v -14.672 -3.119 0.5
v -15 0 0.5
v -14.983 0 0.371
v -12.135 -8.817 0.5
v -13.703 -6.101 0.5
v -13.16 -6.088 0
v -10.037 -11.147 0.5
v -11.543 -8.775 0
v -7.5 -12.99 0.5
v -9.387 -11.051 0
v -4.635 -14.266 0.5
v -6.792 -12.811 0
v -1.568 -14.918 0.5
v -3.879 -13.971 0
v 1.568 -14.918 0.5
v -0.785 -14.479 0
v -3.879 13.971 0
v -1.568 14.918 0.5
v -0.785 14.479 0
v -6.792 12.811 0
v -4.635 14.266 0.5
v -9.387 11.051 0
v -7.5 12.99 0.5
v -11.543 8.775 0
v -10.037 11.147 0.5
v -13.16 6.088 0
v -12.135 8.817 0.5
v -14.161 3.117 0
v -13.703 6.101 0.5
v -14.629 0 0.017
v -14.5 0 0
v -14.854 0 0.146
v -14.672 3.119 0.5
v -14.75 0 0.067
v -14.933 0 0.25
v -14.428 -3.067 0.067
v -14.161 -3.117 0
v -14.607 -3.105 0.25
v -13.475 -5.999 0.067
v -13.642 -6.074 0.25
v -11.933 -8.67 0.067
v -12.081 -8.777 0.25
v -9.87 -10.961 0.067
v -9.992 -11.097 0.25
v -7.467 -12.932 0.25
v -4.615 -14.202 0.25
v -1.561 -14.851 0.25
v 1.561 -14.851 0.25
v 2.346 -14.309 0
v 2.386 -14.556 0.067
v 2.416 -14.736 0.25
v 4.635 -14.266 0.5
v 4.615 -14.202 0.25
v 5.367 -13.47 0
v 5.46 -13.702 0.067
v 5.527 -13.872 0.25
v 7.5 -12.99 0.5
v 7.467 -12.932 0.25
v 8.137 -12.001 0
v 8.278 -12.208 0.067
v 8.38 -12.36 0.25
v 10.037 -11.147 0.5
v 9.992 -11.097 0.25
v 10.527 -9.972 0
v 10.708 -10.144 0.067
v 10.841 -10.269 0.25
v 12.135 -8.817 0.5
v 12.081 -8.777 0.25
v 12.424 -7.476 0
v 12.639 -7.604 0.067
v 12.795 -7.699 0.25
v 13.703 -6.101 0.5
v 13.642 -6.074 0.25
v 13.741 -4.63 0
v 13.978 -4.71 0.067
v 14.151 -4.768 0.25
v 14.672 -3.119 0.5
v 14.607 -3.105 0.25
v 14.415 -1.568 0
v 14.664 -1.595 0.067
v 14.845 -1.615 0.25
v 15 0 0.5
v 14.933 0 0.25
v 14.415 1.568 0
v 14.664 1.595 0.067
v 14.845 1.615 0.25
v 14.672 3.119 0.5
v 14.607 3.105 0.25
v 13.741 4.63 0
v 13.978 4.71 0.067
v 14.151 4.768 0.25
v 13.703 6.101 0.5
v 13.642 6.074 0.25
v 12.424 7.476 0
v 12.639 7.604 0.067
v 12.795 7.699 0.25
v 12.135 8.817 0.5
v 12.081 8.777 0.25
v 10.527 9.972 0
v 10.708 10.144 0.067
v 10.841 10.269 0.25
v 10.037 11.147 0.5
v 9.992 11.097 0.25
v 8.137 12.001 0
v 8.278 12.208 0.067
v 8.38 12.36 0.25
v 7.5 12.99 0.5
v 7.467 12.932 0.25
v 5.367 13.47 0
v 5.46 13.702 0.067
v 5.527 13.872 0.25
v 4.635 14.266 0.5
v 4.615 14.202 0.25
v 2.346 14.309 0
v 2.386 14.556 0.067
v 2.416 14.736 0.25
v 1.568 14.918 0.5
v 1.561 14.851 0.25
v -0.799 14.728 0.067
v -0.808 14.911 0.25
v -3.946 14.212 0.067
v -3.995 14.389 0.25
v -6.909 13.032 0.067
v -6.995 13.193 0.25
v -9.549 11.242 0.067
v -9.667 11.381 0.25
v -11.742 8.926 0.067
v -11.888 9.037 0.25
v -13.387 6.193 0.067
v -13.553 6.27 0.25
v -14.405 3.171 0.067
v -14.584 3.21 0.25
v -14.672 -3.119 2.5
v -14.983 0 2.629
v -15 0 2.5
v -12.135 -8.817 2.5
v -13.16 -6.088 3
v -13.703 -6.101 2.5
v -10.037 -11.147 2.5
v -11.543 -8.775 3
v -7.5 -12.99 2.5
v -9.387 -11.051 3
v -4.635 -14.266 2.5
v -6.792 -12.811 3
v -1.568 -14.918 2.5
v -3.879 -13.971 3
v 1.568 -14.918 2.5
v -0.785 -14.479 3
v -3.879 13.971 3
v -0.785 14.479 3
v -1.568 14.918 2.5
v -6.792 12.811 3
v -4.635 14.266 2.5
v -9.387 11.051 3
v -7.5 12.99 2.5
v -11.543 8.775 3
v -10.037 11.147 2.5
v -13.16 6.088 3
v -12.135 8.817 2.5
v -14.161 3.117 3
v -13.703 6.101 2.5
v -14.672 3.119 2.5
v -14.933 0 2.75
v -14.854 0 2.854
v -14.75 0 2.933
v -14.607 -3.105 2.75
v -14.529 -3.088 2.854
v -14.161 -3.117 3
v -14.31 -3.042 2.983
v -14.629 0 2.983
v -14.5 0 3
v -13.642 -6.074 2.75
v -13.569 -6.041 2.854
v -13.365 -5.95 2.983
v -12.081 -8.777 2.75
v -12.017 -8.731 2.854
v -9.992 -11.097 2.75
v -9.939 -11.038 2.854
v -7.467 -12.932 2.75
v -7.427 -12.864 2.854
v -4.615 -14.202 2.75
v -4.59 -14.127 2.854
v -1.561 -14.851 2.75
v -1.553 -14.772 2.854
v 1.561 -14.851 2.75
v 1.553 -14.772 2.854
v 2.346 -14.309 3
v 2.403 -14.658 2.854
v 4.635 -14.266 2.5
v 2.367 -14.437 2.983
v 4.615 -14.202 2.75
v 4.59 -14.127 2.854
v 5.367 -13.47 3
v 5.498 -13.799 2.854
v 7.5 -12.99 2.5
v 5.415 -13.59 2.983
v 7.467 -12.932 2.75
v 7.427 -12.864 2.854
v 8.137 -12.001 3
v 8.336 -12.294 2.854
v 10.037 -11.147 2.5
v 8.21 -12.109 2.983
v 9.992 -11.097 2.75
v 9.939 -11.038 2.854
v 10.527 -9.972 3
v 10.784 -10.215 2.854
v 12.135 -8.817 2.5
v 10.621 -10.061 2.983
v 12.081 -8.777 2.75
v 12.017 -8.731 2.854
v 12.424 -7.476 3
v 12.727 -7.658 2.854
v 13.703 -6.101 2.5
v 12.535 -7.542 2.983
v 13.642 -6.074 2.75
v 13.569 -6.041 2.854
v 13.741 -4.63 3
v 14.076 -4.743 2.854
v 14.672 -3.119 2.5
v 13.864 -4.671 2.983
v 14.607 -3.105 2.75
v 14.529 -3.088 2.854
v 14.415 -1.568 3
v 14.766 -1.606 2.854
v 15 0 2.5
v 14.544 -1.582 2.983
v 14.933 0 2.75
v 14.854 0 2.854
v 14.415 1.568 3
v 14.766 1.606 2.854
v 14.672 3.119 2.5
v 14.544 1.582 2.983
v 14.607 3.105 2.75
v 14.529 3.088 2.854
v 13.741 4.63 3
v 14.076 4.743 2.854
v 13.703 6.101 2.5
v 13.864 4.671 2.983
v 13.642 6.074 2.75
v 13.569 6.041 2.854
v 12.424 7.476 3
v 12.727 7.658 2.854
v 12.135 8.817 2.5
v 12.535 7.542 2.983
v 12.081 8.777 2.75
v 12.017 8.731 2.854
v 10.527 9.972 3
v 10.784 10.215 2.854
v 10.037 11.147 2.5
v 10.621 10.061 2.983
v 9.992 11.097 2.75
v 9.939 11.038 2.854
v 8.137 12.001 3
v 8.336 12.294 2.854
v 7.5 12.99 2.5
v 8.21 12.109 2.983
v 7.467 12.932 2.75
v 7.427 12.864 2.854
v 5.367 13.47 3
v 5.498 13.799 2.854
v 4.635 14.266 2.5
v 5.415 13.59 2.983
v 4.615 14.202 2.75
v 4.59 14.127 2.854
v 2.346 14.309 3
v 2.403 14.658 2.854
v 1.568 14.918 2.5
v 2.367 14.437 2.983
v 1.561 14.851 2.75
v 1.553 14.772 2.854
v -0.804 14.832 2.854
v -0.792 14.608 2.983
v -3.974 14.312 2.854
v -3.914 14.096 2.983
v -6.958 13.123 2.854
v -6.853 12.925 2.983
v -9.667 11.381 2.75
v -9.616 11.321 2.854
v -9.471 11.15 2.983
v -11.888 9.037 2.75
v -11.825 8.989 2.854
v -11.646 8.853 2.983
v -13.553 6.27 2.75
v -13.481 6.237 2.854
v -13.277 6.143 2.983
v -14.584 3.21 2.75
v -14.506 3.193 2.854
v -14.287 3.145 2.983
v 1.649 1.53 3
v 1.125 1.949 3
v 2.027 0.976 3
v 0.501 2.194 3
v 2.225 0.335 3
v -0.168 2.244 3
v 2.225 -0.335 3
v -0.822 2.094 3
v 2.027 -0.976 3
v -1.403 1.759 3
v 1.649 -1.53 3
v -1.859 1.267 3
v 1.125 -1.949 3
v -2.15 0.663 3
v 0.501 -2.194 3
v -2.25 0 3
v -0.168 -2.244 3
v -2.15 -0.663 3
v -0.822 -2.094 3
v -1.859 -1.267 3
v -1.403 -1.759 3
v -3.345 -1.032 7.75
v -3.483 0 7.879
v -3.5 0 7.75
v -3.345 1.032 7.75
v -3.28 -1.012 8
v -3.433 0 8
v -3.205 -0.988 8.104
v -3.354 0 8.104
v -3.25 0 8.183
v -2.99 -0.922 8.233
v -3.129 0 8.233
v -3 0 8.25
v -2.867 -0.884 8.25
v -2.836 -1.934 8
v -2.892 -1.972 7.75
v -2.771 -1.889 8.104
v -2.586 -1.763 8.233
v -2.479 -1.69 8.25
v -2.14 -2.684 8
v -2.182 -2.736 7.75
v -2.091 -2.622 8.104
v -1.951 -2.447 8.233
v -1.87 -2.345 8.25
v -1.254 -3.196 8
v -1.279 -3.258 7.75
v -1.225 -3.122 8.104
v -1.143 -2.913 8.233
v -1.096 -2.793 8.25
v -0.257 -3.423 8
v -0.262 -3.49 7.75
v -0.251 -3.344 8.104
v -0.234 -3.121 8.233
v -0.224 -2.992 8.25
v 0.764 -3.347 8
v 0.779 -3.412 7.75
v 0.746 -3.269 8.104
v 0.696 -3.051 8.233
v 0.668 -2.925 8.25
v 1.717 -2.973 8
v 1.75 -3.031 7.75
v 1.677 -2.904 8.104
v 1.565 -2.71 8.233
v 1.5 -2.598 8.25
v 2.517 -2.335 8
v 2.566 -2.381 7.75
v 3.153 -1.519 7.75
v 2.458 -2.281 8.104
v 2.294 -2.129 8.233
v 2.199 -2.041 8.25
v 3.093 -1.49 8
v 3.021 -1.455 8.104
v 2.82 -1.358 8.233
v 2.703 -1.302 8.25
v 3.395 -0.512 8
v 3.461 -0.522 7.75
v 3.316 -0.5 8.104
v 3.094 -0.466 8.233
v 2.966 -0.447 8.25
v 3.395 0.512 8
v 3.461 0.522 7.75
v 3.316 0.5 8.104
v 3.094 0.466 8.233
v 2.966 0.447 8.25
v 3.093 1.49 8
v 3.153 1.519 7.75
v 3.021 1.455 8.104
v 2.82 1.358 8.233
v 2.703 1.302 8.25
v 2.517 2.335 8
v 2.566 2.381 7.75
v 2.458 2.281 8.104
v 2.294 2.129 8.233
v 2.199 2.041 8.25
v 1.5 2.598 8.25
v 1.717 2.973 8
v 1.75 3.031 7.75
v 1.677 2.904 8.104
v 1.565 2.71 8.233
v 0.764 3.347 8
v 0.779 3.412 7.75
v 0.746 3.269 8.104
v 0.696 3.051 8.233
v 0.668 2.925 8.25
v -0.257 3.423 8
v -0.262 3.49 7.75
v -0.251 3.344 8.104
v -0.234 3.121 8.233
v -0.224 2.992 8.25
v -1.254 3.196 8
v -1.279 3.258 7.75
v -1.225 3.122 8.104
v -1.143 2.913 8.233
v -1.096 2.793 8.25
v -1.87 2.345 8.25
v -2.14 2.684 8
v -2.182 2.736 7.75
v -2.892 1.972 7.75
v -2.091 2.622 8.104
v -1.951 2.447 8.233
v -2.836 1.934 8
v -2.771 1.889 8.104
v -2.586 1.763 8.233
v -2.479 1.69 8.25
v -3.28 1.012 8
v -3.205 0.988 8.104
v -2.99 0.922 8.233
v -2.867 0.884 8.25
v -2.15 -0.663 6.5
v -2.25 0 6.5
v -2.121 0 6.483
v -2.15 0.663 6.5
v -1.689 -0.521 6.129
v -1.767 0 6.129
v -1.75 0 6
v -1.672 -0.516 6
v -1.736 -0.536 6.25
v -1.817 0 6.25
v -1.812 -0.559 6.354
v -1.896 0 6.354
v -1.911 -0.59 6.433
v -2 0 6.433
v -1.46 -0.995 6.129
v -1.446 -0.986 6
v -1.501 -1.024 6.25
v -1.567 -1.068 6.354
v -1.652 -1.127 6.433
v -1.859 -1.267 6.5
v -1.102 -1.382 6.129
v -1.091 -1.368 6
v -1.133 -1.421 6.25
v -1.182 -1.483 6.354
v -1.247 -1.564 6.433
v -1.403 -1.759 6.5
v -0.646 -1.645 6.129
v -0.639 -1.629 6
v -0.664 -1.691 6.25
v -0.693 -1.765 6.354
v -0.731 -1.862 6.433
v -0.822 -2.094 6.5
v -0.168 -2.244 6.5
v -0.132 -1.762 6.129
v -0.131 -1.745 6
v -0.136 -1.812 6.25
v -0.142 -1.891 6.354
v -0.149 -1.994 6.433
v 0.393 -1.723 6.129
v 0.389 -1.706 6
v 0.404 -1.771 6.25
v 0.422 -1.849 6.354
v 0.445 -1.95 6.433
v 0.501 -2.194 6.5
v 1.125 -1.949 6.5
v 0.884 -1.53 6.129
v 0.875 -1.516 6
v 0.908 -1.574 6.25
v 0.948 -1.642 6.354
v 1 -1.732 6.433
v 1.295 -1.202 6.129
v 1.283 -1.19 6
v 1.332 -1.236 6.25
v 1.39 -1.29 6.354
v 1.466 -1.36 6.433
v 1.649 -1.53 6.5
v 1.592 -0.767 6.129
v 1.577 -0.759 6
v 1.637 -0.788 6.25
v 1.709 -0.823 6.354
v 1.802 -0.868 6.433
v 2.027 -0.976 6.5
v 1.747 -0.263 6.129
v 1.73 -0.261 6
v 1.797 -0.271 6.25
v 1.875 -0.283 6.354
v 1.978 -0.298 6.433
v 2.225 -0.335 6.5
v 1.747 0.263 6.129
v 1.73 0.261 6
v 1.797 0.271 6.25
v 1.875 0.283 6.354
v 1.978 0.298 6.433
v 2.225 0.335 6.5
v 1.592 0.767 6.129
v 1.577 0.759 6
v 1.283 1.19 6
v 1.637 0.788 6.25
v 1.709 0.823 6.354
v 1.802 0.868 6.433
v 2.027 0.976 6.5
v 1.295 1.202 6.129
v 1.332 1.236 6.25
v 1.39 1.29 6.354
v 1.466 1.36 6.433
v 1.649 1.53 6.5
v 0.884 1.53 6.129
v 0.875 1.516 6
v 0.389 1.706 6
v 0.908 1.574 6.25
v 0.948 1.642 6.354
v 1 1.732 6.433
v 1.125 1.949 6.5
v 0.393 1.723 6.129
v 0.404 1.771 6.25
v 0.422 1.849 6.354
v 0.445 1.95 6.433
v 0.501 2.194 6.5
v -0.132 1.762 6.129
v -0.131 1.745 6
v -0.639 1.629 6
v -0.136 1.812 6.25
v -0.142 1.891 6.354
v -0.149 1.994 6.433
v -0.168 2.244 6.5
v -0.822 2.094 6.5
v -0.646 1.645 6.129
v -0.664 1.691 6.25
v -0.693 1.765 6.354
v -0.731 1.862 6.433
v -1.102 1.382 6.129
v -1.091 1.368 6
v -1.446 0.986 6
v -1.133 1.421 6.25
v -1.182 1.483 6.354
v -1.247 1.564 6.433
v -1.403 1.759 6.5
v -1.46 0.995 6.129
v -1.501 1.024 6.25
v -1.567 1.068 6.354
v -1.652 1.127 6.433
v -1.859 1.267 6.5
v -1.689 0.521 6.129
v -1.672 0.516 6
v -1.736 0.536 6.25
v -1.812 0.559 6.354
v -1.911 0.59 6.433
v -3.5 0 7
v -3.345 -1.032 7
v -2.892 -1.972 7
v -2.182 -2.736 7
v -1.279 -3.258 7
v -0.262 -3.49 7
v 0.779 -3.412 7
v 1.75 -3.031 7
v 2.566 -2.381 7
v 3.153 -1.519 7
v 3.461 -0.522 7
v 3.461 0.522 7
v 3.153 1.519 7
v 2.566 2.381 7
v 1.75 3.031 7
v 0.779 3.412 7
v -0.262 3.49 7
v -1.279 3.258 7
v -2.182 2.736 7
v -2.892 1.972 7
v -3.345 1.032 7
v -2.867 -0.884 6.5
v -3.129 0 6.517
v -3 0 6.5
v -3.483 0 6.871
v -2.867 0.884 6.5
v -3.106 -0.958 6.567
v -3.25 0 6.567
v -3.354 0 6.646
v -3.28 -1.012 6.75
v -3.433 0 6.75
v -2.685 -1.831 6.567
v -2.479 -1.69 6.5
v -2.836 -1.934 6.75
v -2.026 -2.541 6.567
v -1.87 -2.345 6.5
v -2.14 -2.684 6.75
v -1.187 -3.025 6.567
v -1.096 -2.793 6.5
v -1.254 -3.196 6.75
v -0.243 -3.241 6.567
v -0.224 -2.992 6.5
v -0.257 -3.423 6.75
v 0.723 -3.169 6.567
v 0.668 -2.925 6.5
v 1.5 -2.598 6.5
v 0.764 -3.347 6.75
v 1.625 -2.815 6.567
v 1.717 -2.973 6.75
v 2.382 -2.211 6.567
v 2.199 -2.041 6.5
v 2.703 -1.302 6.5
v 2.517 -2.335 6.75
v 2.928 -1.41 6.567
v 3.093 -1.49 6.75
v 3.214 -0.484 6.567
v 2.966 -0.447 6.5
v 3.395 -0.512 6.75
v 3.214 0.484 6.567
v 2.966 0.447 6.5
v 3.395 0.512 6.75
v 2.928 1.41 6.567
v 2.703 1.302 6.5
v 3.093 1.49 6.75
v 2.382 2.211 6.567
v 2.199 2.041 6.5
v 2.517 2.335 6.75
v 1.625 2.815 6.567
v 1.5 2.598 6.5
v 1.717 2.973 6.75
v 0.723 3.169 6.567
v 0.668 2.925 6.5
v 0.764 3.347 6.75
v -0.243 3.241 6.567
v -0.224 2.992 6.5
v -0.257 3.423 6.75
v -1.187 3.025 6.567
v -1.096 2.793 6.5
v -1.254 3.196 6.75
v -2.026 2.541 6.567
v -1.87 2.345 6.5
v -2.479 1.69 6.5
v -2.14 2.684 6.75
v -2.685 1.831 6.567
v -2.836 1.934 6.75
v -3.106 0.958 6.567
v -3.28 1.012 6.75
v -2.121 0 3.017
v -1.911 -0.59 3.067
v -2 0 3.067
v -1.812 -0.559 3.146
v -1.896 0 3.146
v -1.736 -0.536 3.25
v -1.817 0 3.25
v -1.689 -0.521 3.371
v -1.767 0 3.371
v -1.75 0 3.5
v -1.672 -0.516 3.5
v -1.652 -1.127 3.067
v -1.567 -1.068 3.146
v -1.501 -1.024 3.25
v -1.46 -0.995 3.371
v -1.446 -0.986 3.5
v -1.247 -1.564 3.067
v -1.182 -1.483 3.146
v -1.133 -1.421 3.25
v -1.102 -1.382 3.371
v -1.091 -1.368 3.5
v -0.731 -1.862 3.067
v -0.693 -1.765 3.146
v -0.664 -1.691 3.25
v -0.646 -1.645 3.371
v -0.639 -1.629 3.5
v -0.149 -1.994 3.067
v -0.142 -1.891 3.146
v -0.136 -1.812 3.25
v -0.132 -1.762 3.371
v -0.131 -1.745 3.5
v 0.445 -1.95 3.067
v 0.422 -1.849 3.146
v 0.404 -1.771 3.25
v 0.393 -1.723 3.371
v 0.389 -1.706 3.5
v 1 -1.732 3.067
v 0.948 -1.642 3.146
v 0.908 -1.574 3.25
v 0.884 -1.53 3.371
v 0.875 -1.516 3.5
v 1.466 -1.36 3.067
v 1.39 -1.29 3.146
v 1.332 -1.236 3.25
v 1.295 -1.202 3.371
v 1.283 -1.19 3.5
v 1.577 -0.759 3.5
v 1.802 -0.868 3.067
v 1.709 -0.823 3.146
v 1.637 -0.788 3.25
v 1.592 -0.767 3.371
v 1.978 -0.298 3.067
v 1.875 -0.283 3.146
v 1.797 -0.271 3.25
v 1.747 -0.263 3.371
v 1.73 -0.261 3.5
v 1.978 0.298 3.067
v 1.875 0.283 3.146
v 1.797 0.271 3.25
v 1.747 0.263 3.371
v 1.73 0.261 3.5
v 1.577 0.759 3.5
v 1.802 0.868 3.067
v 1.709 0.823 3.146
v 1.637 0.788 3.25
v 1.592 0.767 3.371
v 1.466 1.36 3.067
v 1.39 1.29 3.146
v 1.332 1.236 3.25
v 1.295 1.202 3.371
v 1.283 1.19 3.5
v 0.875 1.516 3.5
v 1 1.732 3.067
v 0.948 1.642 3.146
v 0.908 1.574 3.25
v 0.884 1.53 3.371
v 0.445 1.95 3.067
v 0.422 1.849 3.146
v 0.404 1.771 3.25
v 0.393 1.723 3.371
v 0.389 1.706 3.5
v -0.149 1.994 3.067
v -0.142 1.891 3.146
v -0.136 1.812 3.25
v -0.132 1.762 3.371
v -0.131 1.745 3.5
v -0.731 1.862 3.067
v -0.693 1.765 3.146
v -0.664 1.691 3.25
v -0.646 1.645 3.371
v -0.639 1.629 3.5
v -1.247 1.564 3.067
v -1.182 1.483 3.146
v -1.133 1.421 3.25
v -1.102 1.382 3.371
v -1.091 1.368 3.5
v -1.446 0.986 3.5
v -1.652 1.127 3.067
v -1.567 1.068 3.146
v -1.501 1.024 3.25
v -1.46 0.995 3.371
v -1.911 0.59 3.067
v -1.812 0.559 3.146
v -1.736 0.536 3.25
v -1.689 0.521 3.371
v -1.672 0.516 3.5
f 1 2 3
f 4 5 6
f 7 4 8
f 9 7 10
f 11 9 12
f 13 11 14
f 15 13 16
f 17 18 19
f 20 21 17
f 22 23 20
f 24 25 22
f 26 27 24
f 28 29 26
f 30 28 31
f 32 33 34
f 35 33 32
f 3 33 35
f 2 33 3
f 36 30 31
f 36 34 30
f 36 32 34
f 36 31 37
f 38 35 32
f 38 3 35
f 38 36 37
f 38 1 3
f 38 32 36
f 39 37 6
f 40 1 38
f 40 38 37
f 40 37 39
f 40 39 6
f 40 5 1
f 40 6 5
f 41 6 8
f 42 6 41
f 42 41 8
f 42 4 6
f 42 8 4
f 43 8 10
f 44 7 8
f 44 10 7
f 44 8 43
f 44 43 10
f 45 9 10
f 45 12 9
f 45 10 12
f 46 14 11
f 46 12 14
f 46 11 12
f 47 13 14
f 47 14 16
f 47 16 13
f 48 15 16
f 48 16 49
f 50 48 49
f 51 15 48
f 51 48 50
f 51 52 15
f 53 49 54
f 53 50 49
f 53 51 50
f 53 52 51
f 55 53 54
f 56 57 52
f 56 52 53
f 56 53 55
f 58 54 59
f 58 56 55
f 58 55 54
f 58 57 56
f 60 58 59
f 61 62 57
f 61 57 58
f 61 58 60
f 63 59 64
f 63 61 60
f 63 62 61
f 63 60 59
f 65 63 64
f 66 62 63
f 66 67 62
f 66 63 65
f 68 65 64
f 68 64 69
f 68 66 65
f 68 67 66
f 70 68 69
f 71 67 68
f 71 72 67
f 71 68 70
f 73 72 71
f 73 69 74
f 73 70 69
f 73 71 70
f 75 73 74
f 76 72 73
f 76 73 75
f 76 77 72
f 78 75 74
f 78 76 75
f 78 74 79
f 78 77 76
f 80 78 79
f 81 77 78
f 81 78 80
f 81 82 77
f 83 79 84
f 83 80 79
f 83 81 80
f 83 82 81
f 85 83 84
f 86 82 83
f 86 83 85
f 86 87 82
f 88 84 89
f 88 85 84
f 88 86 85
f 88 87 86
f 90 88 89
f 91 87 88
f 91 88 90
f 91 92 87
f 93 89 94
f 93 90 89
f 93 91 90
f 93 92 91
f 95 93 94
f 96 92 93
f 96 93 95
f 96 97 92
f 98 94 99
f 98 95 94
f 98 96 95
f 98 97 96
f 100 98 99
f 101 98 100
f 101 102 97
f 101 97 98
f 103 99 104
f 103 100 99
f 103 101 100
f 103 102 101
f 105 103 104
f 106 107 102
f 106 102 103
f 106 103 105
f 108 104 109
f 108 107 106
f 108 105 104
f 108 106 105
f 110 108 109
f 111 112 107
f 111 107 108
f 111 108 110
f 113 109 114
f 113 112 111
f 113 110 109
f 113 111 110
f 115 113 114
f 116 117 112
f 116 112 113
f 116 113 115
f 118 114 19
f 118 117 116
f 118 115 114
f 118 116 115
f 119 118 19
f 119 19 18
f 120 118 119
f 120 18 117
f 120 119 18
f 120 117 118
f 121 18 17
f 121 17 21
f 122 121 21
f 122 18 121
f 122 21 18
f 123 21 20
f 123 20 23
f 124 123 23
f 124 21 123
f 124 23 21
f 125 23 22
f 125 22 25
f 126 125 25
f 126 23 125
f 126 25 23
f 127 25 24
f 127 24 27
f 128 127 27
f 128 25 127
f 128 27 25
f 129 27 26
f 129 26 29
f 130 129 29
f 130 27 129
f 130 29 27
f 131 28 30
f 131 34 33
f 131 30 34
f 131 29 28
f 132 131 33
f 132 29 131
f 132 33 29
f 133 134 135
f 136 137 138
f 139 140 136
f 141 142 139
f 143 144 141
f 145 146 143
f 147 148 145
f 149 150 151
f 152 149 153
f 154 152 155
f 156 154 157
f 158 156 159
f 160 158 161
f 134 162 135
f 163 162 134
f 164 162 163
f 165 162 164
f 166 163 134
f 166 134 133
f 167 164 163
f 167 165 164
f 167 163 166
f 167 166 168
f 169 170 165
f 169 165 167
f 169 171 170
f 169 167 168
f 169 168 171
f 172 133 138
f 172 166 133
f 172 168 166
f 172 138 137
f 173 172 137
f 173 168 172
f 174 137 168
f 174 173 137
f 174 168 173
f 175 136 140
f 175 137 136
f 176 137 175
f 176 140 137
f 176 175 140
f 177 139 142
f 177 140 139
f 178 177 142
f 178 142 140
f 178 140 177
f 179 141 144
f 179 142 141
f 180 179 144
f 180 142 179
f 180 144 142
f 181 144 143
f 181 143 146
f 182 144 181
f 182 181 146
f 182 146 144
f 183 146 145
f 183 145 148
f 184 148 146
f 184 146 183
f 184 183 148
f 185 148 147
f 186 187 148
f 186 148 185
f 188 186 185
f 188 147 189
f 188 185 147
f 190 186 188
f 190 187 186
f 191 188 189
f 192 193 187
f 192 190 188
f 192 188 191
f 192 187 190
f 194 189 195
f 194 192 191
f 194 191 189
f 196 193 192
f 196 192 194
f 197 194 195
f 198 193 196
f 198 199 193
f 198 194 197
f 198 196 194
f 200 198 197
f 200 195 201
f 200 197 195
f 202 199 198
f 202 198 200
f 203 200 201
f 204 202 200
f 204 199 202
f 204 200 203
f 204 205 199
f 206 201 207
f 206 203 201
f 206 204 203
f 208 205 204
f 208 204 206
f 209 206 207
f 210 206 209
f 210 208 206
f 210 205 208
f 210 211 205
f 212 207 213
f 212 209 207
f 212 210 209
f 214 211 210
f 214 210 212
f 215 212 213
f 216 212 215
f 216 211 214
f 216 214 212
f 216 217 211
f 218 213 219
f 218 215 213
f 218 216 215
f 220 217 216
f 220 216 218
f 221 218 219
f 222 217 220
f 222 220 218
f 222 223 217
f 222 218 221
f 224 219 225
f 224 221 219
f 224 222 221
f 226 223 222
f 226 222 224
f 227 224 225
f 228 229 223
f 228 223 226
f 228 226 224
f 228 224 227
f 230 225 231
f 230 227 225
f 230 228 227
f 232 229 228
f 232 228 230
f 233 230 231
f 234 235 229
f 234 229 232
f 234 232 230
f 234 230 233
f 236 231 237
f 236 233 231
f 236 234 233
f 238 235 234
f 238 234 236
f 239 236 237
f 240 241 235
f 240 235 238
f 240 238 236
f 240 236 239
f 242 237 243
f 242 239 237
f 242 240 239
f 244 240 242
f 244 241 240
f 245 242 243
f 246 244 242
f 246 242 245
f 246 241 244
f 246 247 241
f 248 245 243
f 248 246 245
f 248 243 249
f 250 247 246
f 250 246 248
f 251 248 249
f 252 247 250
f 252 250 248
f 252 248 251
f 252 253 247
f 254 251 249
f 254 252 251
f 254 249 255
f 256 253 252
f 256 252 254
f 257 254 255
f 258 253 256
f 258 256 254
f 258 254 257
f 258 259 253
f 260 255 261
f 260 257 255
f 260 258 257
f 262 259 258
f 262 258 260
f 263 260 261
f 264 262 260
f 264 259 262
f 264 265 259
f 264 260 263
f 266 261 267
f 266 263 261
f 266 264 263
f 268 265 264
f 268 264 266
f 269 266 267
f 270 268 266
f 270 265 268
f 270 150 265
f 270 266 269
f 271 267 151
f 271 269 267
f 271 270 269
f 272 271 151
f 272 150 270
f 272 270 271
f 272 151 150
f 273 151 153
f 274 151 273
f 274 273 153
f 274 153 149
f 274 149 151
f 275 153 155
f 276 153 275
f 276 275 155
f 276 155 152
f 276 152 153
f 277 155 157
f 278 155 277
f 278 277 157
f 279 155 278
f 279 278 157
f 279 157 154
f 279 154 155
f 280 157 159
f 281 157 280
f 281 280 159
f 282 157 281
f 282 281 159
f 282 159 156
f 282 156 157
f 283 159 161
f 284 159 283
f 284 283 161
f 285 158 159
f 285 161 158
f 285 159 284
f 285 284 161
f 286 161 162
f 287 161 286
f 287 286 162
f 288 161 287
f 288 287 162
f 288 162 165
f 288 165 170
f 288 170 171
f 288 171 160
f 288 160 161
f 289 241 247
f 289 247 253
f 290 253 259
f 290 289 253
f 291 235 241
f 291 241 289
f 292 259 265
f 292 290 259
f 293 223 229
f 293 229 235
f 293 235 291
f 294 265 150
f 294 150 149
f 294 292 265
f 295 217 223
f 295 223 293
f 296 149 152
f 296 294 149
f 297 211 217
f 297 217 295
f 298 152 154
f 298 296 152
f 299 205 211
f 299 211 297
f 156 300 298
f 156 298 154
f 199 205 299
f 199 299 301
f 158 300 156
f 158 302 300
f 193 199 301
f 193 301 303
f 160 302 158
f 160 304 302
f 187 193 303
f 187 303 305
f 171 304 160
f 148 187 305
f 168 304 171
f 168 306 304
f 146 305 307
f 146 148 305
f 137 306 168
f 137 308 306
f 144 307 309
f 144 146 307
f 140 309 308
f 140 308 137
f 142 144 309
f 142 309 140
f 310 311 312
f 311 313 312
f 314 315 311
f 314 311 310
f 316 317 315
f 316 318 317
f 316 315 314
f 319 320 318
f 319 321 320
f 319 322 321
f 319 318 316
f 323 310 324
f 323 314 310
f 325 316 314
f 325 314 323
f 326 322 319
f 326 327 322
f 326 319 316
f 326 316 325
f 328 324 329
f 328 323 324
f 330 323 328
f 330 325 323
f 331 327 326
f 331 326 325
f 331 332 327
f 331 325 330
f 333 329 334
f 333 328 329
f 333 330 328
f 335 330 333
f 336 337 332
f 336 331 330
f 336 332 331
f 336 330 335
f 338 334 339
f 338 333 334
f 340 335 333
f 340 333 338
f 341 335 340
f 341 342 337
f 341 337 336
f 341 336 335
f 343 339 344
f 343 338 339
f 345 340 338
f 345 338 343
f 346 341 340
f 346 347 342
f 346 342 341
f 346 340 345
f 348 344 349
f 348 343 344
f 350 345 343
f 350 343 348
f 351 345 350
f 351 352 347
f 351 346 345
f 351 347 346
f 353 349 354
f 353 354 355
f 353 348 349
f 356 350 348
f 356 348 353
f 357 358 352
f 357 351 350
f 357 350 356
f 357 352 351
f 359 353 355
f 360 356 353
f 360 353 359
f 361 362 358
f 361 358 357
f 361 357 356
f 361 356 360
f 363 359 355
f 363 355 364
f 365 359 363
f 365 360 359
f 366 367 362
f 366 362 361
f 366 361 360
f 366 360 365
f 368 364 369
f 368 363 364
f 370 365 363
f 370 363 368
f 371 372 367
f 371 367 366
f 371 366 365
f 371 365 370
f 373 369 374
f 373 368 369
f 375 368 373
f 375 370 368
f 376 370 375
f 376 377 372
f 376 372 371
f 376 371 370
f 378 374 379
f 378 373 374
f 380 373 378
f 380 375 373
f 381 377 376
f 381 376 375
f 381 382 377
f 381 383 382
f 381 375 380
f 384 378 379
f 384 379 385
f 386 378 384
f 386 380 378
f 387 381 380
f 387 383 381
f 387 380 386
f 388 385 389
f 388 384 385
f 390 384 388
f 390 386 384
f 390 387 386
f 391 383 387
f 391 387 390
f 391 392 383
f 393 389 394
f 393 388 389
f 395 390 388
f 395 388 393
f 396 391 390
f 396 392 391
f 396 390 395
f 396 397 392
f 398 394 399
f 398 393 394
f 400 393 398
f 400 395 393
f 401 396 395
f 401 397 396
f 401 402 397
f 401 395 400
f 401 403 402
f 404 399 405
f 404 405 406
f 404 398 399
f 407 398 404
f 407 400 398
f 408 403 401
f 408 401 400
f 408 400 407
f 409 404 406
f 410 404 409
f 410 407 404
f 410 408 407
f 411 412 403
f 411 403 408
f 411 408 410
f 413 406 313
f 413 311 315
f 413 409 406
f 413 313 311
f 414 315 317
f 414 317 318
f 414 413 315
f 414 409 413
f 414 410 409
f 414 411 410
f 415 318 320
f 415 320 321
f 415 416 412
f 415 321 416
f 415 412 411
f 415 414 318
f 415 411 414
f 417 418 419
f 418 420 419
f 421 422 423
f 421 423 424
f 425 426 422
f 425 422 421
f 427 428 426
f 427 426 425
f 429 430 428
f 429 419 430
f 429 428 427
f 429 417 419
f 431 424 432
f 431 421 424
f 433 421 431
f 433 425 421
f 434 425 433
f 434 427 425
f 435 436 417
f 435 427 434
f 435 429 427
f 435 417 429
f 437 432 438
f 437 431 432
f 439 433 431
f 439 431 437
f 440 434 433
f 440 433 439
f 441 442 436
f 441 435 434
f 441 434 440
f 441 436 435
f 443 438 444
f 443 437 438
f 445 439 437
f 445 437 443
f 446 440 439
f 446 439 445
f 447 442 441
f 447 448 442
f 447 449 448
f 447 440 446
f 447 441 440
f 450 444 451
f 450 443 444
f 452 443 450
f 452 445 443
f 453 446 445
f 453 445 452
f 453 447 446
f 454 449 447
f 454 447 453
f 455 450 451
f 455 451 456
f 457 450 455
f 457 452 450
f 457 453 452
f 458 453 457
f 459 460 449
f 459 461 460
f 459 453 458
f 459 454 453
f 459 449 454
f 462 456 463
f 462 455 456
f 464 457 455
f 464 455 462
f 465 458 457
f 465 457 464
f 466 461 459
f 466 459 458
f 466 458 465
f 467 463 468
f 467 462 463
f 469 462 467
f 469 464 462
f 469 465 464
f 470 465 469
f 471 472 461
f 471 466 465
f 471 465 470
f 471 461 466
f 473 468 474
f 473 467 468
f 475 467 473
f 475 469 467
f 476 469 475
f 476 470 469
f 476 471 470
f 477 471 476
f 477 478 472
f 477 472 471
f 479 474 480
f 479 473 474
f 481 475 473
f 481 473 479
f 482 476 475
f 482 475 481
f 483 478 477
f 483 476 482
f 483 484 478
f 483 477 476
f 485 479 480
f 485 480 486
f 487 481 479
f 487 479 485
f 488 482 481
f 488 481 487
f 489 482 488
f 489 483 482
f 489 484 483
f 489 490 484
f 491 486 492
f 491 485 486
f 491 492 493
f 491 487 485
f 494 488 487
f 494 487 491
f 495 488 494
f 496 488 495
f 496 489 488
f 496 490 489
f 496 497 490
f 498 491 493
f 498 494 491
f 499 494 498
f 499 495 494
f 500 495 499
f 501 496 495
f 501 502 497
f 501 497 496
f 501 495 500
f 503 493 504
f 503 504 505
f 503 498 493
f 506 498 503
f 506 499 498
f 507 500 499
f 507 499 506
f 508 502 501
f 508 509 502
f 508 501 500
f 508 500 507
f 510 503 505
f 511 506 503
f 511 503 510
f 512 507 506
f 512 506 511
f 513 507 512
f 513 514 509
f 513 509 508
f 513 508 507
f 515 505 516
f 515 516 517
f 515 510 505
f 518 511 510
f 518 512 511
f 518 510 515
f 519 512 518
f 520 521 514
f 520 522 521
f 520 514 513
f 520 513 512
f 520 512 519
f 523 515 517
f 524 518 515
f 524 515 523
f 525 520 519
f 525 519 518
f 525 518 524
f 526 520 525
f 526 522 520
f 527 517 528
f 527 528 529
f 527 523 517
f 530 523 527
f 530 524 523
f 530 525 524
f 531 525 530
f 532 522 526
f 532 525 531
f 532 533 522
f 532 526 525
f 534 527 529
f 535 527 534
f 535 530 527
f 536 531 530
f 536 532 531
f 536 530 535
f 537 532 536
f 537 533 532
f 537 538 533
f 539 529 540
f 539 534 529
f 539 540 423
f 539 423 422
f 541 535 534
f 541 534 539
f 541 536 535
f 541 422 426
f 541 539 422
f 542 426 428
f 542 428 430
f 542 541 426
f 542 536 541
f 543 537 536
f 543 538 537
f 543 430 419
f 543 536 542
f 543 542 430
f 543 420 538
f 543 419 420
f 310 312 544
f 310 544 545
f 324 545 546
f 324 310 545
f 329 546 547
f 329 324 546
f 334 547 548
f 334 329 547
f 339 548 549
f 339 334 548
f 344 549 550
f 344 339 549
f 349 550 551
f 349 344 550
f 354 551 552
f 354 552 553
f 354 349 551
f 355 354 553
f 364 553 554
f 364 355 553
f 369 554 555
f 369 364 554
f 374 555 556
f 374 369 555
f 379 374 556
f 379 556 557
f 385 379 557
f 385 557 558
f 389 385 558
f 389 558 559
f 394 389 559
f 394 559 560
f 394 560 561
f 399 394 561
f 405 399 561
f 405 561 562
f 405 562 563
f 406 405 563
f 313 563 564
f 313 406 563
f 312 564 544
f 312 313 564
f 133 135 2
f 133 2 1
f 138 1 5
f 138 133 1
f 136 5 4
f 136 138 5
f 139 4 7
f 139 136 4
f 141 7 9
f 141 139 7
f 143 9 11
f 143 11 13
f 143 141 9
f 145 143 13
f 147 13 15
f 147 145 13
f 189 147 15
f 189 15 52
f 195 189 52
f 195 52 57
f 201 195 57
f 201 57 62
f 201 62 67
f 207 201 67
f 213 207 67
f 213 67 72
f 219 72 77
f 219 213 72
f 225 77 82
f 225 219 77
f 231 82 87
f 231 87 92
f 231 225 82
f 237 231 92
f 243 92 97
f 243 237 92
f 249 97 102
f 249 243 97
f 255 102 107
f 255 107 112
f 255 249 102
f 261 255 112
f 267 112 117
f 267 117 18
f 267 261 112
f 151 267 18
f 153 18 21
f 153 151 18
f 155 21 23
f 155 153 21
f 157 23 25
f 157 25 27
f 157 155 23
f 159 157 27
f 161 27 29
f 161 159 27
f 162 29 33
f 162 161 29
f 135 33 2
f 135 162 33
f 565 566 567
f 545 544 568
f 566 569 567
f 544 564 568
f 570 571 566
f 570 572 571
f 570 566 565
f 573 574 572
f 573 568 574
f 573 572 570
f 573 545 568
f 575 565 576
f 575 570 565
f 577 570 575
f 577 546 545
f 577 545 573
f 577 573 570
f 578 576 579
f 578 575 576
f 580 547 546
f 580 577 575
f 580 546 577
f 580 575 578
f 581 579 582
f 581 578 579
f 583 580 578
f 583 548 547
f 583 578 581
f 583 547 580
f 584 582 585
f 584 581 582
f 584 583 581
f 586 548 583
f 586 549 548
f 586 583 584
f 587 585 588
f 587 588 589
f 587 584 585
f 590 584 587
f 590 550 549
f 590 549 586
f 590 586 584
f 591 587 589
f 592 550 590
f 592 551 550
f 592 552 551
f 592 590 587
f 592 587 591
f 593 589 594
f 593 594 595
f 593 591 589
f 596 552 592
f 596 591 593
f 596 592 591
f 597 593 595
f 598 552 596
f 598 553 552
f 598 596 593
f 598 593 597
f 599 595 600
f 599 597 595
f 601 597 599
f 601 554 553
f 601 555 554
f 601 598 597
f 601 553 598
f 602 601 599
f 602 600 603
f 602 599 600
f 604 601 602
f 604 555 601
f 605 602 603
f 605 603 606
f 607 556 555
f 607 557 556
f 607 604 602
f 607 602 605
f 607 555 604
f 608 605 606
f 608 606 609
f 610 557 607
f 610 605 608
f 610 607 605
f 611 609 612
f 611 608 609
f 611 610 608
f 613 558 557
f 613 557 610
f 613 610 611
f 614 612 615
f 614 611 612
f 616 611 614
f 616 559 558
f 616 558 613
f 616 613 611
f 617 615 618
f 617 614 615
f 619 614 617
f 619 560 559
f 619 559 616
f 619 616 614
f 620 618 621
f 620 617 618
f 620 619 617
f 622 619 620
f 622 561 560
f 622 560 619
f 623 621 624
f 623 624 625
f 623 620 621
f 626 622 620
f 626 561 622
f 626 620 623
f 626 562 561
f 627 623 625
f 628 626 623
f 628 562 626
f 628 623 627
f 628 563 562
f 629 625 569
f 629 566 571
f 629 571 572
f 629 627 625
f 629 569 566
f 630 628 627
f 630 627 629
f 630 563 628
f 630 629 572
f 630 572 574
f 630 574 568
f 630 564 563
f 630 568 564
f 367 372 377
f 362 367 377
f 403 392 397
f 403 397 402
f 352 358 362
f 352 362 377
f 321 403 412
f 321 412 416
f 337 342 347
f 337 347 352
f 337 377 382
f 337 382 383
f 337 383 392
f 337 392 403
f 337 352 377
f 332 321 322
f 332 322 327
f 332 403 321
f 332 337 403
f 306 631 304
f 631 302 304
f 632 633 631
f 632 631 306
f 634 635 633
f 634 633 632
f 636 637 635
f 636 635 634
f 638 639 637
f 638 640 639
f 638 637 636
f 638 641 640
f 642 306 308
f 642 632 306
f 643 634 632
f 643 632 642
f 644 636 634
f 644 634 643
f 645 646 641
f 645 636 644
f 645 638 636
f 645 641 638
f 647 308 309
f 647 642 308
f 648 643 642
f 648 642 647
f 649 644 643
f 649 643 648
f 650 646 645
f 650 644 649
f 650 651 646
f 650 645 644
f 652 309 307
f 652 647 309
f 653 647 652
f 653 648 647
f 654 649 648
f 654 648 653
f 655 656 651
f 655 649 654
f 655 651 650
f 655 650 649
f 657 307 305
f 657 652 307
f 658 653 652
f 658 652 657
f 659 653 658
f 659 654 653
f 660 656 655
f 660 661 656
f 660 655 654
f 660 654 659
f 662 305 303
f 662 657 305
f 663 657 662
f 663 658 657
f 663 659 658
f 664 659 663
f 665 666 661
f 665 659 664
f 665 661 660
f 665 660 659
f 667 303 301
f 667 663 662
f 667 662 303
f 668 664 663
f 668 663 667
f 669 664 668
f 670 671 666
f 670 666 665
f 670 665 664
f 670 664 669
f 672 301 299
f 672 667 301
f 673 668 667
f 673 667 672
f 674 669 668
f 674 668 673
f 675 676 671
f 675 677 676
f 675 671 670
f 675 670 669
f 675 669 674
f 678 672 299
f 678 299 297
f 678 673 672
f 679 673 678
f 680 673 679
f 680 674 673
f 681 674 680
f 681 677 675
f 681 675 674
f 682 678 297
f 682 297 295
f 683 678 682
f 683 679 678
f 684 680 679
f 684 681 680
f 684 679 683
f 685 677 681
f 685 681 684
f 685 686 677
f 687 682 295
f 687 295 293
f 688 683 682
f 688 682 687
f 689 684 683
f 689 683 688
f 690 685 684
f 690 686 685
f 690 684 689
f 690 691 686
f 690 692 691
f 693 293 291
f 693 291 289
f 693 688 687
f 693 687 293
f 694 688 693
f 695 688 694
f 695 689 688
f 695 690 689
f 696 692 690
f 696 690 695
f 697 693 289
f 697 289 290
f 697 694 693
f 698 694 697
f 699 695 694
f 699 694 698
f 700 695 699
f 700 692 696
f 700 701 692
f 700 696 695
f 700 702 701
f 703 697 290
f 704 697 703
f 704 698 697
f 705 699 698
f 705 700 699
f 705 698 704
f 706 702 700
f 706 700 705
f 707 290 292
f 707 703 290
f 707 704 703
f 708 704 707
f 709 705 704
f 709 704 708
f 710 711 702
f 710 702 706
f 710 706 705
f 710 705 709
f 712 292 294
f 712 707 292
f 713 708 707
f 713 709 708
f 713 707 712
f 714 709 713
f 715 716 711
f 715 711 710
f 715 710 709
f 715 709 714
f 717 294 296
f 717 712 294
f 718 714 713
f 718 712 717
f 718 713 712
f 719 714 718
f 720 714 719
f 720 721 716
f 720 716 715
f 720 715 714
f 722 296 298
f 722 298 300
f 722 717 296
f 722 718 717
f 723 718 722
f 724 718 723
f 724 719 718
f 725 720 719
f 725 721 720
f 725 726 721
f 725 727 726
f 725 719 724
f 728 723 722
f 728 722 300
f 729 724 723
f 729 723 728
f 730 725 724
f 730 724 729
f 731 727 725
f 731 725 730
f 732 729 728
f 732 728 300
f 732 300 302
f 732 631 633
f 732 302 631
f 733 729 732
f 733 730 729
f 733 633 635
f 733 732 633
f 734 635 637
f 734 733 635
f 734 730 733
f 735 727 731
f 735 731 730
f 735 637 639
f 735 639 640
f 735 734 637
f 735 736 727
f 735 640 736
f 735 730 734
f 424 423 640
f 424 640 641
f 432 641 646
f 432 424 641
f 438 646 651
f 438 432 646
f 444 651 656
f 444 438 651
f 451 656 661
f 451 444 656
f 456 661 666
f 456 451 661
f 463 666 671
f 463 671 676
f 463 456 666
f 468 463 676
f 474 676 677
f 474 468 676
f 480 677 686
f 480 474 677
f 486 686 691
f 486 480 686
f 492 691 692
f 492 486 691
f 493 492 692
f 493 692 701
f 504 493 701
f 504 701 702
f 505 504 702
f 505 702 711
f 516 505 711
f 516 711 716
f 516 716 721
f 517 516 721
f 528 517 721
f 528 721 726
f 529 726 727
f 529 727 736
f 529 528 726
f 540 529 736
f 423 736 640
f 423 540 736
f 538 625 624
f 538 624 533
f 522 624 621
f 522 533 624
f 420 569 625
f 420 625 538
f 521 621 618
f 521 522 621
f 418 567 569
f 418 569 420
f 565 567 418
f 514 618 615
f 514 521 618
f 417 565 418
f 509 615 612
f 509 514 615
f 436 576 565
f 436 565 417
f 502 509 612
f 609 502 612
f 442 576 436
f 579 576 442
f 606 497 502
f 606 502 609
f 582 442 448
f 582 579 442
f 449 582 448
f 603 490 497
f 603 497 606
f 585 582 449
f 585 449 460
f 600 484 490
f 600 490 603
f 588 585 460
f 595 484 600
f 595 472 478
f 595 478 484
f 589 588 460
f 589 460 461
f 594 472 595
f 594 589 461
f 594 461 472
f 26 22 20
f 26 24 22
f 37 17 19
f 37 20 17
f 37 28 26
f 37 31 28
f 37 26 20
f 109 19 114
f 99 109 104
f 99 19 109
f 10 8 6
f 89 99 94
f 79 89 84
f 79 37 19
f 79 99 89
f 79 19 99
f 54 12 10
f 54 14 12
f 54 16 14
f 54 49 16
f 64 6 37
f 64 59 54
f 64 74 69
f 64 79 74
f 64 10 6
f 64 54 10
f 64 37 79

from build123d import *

# Parameters (mm, degrees)
FILLET_R = 0.5


with BuildPart() as part:
    # Sketch → Revolution (revolve)
    with BuildSketch(Plane.XZ):
        Polygon((0, 0), (-15, 0), (-15, 3), (-1.75, 3), (-1.75, 6.5), (-3.5, 6.5), (-3.5, 8.25), (0, 8.25), align=None)
    revolve(axis=Axis((0, 0, 0), (0, 0, 1)))

    # Fillet
    fillet_edges = [part.edges().sort_by_distance(p)[0] for p in [
        (15, 0, 0),
        (15, 0, 3),
        (-15, 0, 1.5),
        (1.75, 0, 3),
        (1.75, 0, 6.5),
        (-1.75, 0, 4.75),
        (3.5, 0, 6.5),
        (3.5, 0, 8.25),
        (-3.5, 0, 7.375),
    ]]
    fillet(fillet_edges, radius=FILLET_R)


solid = part.part
